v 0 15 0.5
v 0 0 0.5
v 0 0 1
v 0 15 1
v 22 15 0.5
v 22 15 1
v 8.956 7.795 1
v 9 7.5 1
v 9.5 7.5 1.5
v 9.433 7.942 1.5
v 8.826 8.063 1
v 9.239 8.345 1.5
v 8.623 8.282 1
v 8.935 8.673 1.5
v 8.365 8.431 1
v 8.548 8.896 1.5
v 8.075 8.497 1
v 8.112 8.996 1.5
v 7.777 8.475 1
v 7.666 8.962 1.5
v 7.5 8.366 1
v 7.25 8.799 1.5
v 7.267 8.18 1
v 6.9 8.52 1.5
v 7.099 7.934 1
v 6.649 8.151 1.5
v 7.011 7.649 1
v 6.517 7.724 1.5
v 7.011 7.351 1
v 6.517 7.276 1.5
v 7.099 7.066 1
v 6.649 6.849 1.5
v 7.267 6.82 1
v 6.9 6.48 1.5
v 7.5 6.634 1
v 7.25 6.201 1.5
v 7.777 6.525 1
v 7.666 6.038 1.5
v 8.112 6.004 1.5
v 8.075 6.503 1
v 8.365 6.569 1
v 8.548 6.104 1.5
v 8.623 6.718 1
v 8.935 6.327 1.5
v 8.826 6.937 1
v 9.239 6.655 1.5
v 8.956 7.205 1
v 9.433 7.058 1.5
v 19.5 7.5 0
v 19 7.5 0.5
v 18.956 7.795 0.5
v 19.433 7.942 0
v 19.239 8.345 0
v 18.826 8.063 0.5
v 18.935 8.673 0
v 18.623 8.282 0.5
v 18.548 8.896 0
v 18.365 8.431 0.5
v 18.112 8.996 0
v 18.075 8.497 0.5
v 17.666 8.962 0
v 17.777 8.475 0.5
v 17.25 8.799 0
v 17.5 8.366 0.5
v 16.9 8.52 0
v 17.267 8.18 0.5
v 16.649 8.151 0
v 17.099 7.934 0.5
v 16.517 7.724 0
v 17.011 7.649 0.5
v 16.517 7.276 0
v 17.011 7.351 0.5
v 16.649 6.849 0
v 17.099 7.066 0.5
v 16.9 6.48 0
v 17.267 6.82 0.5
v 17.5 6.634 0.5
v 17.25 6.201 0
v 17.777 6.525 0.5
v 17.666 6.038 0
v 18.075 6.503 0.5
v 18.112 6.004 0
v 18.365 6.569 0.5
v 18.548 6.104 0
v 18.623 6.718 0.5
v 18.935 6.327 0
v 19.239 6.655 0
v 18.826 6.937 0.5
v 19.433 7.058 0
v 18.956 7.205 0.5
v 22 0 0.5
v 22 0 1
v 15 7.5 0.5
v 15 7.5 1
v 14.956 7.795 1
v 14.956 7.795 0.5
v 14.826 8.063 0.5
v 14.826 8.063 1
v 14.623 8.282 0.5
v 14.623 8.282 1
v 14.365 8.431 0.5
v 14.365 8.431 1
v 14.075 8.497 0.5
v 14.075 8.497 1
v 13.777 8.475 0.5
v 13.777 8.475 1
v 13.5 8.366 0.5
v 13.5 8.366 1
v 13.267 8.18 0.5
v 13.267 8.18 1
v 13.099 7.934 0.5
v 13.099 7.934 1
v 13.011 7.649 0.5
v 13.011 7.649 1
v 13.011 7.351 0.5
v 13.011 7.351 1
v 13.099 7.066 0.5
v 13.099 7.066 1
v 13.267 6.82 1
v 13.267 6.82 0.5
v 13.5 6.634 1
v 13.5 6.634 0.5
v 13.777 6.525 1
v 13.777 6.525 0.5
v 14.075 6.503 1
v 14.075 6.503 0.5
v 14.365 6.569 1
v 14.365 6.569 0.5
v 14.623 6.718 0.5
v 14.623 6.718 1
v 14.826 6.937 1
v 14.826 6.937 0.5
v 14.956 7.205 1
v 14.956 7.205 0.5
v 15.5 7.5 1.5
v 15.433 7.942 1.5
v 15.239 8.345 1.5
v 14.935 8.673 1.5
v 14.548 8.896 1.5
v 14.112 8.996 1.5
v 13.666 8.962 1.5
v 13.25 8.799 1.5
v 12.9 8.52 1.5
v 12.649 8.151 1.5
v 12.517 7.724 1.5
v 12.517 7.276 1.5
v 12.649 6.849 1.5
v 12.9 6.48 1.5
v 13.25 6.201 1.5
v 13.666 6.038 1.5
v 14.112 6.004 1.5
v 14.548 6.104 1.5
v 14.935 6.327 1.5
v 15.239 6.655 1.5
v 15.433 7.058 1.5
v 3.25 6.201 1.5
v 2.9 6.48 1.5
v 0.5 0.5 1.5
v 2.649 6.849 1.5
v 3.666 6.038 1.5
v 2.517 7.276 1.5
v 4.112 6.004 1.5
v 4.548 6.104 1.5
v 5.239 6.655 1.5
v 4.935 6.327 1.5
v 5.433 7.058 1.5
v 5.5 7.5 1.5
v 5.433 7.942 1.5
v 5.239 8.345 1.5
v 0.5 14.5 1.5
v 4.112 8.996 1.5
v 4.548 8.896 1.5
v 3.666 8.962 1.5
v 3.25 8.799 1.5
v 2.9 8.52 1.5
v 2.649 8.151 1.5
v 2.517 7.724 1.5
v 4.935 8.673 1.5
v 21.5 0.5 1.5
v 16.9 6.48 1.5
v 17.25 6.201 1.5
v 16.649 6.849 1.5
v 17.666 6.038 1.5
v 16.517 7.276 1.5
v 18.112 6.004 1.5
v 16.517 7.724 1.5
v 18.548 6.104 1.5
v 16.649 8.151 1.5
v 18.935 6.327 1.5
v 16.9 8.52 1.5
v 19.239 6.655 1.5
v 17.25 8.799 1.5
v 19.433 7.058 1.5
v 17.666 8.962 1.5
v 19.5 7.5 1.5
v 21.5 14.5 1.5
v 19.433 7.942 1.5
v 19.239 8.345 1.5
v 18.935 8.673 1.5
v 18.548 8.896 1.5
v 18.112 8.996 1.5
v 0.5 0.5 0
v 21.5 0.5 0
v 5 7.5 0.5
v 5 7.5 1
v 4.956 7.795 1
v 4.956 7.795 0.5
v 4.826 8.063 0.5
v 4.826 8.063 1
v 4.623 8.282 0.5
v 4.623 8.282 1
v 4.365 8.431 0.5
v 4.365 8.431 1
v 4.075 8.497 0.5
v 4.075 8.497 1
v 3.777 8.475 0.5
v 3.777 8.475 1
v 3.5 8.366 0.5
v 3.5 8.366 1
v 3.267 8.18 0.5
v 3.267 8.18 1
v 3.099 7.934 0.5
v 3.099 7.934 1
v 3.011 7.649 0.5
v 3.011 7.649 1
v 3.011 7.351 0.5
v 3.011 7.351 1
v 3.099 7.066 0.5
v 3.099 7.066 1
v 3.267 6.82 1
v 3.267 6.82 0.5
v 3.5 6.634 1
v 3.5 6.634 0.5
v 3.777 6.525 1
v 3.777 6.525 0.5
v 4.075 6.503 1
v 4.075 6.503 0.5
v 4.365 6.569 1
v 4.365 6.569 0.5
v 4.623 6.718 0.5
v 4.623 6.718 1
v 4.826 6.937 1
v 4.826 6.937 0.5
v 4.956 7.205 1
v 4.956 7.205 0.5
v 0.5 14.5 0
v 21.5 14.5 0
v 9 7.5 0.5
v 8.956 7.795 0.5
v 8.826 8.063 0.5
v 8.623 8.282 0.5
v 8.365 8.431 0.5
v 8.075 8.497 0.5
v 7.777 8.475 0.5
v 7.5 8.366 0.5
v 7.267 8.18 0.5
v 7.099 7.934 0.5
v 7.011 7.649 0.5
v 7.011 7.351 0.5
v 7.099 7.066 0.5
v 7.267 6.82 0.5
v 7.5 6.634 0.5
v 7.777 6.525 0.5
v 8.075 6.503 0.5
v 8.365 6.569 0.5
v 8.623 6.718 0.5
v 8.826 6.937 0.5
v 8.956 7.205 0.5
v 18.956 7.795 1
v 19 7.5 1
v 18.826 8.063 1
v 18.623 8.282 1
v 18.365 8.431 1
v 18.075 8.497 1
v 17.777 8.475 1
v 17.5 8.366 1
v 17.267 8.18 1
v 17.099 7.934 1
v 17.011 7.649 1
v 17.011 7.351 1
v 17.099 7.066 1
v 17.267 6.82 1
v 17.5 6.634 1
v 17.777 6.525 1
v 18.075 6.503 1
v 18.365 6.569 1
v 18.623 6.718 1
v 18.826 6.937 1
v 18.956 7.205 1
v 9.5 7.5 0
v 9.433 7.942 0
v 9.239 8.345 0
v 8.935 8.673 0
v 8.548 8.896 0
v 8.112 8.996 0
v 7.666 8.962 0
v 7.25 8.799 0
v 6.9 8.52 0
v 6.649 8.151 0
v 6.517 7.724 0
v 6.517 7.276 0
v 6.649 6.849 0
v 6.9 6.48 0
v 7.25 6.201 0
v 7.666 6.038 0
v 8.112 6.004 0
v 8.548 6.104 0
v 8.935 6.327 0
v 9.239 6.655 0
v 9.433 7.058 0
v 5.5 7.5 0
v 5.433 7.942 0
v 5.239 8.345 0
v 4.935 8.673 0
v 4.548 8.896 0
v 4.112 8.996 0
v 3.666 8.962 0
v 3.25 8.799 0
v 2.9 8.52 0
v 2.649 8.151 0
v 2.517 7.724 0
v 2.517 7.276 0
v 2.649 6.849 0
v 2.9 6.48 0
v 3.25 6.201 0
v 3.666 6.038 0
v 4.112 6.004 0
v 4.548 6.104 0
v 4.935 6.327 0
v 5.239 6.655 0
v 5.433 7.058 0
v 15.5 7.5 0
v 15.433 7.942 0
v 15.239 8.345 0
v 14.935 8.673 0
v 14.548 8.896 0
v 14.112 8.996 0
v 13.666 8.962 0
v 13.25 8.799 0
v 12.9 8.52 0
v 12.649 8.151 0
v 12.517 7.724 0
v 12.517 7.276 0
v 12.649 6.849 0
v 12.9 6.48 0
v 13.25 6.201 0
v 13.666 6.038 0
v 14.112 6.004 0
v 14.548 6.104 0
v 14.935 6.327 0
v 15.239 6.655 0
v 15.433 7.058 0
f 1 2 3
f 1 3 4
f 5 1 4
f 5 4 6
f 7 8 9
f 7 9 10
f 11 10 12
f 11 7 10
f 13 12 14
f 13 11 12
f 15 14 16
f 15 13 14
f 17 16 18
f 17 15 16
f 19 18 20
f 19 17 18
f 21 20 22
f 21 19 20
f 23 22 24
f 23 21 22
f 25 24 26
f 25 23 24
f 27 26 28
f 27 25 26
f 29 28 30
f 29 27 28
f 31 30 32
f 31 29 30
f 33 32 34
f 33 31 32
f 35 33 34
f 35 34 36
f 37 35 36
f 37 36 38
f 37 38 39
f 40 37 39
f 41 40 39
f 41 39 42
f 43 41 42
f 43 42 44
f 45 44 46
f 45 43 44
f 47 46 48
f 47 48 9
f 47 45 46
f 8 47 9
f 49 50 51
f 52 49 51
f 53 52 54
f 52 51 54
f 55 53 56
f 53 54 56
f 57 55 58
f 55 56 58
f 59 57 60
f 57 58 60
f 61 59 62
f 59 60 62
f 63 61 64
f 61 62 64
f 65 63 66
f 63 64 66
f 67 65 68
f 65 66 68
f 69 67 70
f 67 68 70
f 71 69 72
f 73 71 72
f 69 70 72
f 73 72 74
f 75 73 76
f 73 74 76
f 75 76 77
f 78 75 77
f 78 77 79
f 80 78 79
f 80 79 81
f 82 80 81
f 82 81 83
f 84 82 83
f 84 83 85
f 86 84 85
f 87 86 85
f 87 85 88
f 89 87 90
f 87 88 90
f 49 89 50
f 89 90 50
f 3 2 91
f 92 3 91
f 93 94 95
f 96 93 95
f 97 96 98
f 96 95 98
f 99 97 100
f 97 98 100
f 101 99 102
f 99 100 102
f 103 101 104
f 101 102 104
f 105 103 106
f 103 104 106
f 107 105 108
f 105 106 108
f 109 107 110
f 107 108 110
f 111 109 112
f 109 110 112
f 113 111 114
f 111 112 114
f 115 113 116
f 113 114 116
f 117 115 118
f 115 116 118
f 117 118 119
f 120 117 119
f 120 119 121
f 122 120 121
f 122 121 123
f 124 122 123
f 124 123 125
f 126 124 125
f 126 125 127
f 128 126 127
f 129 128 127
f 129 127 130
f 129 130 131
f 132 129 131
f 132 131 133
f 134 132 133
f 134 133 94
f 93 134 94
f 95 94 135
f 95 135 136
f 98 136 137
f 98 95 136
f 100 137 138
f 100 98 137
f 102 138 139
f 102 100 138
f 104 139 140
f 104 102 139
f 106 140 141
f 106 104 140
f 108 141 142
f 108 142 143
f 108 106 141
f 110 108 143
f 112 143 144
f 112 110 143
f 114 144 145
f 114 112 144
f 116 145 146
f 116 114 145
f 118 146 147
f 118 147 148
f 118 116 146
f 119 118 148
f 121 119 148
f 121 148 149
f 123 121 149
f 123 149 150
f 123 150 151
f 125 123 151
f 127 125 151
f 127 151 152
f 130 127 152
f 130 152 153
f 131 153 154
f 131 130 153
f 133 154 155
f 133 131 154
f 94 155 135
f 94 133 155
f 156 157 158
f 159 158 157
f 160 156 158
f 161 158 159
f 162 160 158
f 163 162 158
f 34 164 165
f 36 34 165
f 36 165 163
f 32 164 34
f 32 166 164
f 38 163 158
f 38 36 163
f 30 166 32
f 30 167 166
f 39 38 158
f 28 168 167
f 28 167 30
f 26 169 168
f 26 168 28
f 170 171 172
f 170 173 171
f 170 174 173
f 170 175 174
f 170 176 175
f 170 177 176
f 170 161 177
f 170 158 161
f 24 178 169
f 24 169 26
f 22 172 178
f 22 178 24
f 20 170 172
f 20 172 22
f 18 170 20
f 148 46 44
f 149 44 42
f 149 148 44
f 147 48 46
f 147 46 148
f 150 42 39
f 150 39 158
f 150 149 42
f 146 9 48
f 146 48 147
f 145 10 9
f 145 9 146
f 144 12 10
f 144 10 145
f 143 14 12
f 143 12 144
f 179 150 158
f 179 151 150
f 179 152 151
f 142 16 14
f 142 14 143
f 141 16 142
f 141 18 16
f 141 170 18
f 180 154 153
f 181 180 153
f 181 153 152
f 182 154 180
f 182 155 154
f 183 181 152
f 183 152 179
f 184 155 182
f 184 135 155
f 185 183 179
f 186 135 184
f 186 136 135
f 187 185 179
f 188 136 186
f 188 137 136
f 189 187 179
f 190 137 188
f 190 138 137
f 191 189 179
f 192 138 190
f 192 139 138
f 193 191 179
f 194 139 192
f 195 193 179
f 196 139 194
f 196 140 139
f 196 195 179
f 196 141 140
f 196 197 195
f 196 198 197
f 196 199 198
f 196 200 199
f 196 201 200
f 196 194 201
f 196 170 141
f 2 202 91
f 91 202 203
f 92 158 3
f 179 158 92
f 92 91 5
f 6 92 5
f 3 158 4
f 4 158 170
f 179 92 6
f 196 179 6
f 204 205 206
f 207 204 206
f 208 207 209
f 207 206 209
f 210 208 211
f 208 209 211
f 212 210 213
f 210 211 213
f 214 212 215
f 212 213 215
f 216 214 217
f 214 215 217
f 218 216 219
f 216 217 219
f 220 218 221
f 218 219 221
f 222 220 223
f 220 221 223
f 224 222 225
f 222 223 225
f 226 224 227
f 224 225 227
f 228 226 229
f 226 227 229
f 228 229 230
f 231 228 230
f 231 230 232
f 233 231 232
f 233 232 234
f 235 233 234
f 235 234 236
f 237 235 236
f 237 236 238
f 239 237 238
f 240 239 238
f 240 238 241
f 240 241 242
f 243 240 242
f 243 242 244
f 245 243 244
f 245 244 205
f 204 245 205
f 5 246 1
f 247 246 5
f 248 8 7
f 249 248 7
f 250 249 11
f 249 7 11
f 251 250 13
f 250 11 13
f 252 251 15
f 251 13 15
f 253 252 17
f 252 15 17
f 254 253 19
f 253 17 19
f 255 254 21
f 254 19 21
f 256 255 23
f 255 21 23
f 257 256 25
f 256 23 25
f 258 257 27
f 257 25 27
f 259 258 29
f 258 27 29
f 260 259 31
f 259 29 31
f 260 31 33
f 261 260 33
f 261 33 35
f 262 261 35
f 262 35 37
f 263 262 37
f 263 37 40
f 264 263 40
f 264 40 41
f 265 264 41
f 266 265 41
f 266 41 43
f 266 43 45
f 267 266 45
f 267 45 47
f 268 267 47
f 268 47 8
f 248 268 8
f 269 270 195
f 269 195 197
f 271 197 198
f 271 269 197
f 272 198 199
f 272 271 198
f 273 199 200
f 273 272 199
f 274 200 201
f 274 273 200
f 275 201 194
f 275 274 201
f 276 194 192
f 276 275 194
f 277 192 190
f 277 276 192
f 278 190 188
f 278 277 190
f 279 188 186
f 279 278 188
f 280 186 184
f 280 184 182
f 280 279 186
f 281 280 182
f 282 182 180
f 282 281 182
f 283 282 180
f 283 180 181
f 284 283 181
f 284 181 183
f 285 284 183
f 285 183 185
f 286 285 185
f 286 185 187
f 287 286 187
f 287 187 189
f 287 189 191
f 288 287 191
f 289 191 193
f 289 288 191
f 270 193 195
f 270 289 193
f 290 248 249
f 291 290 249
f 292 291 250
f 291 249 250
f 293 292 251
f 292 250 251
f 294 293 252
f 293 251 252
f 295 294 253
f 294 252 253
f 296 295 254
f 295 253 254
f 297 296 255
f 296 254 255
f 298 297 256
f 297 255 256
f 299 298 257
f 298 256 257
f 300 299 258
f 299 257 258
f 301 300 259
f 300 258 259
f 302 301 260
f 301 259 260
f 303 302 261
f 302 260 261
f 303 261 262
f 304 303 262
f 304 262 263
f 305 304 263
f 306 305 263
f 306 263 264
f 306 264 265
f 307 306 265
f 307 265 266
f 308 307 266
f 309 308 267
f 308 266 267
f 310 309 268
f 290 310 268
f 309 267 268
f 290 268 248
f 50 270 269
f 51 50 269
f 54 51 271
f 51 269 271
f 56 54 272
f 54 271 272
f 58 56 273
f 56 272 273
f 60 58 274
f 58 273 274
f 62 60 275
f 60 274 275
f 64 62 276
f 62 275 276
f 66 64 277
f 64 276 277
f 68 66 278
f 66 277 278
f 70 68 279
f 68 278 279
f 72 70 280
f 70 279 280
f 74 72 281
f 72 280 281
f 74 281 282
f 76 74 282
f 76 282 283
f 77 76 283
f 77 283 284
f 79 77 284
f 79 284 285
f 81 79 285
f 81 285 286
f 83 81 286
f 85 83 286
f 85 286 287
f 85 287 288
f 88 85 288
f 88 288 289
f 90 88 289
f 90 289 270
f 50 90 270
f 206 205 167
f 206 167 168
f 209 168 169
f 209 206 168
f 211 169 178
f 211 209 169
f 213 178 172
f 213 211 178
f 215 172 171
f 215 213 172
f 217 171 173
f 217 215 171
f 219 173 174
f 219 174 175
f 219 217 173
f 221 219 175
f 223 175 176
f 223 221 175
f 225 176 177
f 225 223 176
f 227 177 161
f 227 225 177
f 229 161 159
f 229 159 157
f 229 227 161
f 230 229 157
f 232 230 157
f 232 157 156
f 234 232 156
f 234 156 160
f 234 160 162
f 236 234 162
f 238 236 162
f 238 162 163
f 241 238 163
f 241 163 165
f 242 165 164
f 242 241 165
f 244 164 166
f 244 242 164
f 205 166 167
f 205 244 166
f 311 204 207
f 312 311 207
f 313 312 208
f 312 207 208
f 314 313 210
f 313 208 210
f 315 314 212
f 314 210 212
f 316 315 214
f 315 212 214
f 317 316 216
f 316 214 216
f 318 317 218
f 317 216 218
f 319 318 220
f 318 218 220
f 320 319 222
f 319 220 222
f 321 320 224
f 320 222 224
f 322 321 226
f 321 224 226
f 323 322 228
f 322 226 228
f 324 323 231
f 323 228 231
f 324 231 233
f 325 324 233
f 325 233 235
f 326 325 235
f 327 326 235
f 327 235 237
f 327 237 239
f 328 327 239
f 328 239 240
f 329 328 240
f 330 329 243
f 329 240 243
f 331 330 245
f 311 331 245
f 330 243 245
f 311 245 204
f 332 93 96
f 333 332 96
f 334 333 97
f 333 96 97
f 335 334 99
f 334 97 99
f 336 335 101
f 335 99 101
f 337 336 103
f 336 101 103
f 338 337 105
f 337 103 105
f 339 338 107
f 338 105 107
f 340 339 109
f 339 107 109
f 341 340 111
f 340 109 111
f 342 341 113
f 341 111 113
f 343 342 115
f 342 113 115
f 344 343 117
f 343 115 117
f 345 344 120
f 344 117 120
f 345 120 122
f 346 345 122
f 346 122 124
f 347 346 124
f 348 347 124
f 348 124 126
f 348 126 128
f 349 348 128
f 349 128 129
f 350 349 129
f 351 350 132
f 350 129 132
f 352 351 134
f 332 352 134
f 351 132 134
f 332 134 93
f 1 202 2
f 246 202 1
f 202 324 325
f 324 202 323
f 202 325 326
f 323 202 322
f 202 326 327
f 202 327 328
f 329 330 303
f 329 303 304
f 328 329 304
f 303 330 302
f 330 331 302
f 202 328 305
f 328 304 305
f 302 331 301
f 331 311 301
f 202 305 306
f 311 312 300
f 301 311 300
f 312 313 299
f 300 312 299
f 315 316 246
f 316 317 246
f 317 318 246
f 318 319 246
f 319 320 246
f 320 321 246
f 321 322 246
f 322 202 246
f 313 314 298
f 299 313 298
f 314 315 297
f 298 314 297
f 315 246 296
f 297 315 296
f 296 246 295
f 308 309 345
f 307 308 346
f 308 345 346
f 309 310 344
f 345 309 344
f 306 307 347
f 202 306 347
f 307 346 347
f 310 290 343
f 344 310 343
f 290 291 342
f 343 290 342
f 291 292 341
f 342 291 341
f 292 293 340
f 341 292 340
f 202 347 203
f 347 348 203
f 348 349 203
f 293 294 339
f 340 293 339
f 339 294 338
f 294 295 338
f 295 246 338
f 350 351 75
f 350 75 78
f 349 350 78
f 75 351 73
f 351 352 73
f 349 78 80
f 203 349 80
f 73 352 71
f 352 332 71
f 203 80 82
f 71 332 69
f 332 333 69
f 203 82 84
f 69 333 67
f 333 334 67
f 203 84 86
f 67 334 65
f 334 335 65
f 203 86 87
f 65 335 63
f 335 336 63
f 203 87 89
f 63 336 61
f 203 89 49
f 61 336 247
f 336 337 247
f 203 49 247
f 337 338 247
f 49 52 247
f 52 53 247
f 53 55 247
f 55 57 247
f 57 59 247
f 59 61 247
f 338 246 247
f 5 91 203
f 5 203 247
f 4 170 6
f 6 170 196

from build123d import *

# Parameters (mm, degrees)
F0_W     = 22
F0_H     = 15
F1_DEPTH = 1.5
F2_R     = 1
F3_DEPTH = 1.501
F4_SIZE  = 0.5


with BuildPart() as f1:
    # F0 (on Top) → F1 (new body)
    with BuildSketch(Plane.XY):
        with Locations((11, 7.5)):
            Rectangle(F0_W, F0_H)
    extrude(amount=F1_DEPTH)

    # F2 (on face) → F3 (cut, through all)
    with BuildSketch(Plane.XY.offset(1.5)):
        with Locations((4, 7.5)):
            Circle(F2_R)
        with Locations((8, 7.5)):
            Circle(F2_R)
        with Locations((14, 7.5)):
            Circle(F2_R)
        with Locations((18, 7.5)):
            Circle(F2_R)
    extrude(amount=-F3_DEPTH, mode=Mode.SUBTRACT)

    # F4
    f4_edges = [f1.edges().sort_by_distance(p)[0] for p in [
        (0, 7.5, 1.5),
        (11, 15, 1.5),
        (11, 0, 1.5),
        (22, 7.5, 1.5),
        (3, 7.5, 1.5),
        (7, 7.5, 1.5),
        (13, 7.5, 1.5),
        (17, 7.5, 1.5),
        (0, 7.5, 0),
        (11, 15, 0),
        (11, 0, 0),
        (22, 7.5, 0),
        (3, 7.5, 0),
        (7, 7.5, 0),
        (13, 7.5, 0),
        (17, 7.5, 0),
    ]]
    chamfer(f4_edges, length=F4_SIZE)


solid = f1.part
